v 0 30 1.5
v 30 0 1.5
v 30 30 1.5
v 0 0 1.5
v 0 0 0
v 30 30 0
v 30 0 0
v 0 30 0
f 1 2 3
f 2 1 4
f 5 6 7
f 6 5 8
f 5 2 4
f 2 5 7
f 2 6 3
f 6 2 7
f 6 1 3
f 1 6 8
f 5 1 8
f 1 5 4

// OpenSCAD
/* Open SCAD Name.: BagDispenser_v1.scad
*  Copyright (c)..: 2017 www.DIY3DTech.com
*
*  Creation Date..: July-2017
*  Description....: Code to create pegboard bag dispenser
*
*  Rev 1: Develop Model
*  Rev 2: 
*
*  This program is free software; you can redistribute it and/or modify
*  it under the terms of the GNU General Public License as published by
*  the Free Software Foundation; either version 2 of the License, or
*  (at your option) any later version.
*
*  This program is distributed in the hope that it will be useful,
*  but WITHOUT ANY WARRANTY; without even the implied warranty of
*  MERCHANTABILITY or FITNESS FOR A PARTICULAR PURPOSE.  See the
*  GNU General Public License for more details.
*/ 

/*------------------Customizer View-------------------*/

// preview[view:north, tilt:top]

/*---------------------Parameters---------------------*/

//board width in mm
board_width         =   30; //[1:1:500]

//board height in mm
board_height        =   30 ; //[1:1:500]

//board thickness in mm
board_thick         =     1.5; //[1:0.5:10]
/*-----------------------Execute----------------------*/

main_module();

/*-----------------------Modules----------------------*/

module main_module(){ //create module
    difference() {
            union() {//start union
           cube([board_width,board_height,board_thick],false);     
                
            } //end union

    
     } //end difference
         
} //end module
           
/*----------------------End Code----------------------*/
